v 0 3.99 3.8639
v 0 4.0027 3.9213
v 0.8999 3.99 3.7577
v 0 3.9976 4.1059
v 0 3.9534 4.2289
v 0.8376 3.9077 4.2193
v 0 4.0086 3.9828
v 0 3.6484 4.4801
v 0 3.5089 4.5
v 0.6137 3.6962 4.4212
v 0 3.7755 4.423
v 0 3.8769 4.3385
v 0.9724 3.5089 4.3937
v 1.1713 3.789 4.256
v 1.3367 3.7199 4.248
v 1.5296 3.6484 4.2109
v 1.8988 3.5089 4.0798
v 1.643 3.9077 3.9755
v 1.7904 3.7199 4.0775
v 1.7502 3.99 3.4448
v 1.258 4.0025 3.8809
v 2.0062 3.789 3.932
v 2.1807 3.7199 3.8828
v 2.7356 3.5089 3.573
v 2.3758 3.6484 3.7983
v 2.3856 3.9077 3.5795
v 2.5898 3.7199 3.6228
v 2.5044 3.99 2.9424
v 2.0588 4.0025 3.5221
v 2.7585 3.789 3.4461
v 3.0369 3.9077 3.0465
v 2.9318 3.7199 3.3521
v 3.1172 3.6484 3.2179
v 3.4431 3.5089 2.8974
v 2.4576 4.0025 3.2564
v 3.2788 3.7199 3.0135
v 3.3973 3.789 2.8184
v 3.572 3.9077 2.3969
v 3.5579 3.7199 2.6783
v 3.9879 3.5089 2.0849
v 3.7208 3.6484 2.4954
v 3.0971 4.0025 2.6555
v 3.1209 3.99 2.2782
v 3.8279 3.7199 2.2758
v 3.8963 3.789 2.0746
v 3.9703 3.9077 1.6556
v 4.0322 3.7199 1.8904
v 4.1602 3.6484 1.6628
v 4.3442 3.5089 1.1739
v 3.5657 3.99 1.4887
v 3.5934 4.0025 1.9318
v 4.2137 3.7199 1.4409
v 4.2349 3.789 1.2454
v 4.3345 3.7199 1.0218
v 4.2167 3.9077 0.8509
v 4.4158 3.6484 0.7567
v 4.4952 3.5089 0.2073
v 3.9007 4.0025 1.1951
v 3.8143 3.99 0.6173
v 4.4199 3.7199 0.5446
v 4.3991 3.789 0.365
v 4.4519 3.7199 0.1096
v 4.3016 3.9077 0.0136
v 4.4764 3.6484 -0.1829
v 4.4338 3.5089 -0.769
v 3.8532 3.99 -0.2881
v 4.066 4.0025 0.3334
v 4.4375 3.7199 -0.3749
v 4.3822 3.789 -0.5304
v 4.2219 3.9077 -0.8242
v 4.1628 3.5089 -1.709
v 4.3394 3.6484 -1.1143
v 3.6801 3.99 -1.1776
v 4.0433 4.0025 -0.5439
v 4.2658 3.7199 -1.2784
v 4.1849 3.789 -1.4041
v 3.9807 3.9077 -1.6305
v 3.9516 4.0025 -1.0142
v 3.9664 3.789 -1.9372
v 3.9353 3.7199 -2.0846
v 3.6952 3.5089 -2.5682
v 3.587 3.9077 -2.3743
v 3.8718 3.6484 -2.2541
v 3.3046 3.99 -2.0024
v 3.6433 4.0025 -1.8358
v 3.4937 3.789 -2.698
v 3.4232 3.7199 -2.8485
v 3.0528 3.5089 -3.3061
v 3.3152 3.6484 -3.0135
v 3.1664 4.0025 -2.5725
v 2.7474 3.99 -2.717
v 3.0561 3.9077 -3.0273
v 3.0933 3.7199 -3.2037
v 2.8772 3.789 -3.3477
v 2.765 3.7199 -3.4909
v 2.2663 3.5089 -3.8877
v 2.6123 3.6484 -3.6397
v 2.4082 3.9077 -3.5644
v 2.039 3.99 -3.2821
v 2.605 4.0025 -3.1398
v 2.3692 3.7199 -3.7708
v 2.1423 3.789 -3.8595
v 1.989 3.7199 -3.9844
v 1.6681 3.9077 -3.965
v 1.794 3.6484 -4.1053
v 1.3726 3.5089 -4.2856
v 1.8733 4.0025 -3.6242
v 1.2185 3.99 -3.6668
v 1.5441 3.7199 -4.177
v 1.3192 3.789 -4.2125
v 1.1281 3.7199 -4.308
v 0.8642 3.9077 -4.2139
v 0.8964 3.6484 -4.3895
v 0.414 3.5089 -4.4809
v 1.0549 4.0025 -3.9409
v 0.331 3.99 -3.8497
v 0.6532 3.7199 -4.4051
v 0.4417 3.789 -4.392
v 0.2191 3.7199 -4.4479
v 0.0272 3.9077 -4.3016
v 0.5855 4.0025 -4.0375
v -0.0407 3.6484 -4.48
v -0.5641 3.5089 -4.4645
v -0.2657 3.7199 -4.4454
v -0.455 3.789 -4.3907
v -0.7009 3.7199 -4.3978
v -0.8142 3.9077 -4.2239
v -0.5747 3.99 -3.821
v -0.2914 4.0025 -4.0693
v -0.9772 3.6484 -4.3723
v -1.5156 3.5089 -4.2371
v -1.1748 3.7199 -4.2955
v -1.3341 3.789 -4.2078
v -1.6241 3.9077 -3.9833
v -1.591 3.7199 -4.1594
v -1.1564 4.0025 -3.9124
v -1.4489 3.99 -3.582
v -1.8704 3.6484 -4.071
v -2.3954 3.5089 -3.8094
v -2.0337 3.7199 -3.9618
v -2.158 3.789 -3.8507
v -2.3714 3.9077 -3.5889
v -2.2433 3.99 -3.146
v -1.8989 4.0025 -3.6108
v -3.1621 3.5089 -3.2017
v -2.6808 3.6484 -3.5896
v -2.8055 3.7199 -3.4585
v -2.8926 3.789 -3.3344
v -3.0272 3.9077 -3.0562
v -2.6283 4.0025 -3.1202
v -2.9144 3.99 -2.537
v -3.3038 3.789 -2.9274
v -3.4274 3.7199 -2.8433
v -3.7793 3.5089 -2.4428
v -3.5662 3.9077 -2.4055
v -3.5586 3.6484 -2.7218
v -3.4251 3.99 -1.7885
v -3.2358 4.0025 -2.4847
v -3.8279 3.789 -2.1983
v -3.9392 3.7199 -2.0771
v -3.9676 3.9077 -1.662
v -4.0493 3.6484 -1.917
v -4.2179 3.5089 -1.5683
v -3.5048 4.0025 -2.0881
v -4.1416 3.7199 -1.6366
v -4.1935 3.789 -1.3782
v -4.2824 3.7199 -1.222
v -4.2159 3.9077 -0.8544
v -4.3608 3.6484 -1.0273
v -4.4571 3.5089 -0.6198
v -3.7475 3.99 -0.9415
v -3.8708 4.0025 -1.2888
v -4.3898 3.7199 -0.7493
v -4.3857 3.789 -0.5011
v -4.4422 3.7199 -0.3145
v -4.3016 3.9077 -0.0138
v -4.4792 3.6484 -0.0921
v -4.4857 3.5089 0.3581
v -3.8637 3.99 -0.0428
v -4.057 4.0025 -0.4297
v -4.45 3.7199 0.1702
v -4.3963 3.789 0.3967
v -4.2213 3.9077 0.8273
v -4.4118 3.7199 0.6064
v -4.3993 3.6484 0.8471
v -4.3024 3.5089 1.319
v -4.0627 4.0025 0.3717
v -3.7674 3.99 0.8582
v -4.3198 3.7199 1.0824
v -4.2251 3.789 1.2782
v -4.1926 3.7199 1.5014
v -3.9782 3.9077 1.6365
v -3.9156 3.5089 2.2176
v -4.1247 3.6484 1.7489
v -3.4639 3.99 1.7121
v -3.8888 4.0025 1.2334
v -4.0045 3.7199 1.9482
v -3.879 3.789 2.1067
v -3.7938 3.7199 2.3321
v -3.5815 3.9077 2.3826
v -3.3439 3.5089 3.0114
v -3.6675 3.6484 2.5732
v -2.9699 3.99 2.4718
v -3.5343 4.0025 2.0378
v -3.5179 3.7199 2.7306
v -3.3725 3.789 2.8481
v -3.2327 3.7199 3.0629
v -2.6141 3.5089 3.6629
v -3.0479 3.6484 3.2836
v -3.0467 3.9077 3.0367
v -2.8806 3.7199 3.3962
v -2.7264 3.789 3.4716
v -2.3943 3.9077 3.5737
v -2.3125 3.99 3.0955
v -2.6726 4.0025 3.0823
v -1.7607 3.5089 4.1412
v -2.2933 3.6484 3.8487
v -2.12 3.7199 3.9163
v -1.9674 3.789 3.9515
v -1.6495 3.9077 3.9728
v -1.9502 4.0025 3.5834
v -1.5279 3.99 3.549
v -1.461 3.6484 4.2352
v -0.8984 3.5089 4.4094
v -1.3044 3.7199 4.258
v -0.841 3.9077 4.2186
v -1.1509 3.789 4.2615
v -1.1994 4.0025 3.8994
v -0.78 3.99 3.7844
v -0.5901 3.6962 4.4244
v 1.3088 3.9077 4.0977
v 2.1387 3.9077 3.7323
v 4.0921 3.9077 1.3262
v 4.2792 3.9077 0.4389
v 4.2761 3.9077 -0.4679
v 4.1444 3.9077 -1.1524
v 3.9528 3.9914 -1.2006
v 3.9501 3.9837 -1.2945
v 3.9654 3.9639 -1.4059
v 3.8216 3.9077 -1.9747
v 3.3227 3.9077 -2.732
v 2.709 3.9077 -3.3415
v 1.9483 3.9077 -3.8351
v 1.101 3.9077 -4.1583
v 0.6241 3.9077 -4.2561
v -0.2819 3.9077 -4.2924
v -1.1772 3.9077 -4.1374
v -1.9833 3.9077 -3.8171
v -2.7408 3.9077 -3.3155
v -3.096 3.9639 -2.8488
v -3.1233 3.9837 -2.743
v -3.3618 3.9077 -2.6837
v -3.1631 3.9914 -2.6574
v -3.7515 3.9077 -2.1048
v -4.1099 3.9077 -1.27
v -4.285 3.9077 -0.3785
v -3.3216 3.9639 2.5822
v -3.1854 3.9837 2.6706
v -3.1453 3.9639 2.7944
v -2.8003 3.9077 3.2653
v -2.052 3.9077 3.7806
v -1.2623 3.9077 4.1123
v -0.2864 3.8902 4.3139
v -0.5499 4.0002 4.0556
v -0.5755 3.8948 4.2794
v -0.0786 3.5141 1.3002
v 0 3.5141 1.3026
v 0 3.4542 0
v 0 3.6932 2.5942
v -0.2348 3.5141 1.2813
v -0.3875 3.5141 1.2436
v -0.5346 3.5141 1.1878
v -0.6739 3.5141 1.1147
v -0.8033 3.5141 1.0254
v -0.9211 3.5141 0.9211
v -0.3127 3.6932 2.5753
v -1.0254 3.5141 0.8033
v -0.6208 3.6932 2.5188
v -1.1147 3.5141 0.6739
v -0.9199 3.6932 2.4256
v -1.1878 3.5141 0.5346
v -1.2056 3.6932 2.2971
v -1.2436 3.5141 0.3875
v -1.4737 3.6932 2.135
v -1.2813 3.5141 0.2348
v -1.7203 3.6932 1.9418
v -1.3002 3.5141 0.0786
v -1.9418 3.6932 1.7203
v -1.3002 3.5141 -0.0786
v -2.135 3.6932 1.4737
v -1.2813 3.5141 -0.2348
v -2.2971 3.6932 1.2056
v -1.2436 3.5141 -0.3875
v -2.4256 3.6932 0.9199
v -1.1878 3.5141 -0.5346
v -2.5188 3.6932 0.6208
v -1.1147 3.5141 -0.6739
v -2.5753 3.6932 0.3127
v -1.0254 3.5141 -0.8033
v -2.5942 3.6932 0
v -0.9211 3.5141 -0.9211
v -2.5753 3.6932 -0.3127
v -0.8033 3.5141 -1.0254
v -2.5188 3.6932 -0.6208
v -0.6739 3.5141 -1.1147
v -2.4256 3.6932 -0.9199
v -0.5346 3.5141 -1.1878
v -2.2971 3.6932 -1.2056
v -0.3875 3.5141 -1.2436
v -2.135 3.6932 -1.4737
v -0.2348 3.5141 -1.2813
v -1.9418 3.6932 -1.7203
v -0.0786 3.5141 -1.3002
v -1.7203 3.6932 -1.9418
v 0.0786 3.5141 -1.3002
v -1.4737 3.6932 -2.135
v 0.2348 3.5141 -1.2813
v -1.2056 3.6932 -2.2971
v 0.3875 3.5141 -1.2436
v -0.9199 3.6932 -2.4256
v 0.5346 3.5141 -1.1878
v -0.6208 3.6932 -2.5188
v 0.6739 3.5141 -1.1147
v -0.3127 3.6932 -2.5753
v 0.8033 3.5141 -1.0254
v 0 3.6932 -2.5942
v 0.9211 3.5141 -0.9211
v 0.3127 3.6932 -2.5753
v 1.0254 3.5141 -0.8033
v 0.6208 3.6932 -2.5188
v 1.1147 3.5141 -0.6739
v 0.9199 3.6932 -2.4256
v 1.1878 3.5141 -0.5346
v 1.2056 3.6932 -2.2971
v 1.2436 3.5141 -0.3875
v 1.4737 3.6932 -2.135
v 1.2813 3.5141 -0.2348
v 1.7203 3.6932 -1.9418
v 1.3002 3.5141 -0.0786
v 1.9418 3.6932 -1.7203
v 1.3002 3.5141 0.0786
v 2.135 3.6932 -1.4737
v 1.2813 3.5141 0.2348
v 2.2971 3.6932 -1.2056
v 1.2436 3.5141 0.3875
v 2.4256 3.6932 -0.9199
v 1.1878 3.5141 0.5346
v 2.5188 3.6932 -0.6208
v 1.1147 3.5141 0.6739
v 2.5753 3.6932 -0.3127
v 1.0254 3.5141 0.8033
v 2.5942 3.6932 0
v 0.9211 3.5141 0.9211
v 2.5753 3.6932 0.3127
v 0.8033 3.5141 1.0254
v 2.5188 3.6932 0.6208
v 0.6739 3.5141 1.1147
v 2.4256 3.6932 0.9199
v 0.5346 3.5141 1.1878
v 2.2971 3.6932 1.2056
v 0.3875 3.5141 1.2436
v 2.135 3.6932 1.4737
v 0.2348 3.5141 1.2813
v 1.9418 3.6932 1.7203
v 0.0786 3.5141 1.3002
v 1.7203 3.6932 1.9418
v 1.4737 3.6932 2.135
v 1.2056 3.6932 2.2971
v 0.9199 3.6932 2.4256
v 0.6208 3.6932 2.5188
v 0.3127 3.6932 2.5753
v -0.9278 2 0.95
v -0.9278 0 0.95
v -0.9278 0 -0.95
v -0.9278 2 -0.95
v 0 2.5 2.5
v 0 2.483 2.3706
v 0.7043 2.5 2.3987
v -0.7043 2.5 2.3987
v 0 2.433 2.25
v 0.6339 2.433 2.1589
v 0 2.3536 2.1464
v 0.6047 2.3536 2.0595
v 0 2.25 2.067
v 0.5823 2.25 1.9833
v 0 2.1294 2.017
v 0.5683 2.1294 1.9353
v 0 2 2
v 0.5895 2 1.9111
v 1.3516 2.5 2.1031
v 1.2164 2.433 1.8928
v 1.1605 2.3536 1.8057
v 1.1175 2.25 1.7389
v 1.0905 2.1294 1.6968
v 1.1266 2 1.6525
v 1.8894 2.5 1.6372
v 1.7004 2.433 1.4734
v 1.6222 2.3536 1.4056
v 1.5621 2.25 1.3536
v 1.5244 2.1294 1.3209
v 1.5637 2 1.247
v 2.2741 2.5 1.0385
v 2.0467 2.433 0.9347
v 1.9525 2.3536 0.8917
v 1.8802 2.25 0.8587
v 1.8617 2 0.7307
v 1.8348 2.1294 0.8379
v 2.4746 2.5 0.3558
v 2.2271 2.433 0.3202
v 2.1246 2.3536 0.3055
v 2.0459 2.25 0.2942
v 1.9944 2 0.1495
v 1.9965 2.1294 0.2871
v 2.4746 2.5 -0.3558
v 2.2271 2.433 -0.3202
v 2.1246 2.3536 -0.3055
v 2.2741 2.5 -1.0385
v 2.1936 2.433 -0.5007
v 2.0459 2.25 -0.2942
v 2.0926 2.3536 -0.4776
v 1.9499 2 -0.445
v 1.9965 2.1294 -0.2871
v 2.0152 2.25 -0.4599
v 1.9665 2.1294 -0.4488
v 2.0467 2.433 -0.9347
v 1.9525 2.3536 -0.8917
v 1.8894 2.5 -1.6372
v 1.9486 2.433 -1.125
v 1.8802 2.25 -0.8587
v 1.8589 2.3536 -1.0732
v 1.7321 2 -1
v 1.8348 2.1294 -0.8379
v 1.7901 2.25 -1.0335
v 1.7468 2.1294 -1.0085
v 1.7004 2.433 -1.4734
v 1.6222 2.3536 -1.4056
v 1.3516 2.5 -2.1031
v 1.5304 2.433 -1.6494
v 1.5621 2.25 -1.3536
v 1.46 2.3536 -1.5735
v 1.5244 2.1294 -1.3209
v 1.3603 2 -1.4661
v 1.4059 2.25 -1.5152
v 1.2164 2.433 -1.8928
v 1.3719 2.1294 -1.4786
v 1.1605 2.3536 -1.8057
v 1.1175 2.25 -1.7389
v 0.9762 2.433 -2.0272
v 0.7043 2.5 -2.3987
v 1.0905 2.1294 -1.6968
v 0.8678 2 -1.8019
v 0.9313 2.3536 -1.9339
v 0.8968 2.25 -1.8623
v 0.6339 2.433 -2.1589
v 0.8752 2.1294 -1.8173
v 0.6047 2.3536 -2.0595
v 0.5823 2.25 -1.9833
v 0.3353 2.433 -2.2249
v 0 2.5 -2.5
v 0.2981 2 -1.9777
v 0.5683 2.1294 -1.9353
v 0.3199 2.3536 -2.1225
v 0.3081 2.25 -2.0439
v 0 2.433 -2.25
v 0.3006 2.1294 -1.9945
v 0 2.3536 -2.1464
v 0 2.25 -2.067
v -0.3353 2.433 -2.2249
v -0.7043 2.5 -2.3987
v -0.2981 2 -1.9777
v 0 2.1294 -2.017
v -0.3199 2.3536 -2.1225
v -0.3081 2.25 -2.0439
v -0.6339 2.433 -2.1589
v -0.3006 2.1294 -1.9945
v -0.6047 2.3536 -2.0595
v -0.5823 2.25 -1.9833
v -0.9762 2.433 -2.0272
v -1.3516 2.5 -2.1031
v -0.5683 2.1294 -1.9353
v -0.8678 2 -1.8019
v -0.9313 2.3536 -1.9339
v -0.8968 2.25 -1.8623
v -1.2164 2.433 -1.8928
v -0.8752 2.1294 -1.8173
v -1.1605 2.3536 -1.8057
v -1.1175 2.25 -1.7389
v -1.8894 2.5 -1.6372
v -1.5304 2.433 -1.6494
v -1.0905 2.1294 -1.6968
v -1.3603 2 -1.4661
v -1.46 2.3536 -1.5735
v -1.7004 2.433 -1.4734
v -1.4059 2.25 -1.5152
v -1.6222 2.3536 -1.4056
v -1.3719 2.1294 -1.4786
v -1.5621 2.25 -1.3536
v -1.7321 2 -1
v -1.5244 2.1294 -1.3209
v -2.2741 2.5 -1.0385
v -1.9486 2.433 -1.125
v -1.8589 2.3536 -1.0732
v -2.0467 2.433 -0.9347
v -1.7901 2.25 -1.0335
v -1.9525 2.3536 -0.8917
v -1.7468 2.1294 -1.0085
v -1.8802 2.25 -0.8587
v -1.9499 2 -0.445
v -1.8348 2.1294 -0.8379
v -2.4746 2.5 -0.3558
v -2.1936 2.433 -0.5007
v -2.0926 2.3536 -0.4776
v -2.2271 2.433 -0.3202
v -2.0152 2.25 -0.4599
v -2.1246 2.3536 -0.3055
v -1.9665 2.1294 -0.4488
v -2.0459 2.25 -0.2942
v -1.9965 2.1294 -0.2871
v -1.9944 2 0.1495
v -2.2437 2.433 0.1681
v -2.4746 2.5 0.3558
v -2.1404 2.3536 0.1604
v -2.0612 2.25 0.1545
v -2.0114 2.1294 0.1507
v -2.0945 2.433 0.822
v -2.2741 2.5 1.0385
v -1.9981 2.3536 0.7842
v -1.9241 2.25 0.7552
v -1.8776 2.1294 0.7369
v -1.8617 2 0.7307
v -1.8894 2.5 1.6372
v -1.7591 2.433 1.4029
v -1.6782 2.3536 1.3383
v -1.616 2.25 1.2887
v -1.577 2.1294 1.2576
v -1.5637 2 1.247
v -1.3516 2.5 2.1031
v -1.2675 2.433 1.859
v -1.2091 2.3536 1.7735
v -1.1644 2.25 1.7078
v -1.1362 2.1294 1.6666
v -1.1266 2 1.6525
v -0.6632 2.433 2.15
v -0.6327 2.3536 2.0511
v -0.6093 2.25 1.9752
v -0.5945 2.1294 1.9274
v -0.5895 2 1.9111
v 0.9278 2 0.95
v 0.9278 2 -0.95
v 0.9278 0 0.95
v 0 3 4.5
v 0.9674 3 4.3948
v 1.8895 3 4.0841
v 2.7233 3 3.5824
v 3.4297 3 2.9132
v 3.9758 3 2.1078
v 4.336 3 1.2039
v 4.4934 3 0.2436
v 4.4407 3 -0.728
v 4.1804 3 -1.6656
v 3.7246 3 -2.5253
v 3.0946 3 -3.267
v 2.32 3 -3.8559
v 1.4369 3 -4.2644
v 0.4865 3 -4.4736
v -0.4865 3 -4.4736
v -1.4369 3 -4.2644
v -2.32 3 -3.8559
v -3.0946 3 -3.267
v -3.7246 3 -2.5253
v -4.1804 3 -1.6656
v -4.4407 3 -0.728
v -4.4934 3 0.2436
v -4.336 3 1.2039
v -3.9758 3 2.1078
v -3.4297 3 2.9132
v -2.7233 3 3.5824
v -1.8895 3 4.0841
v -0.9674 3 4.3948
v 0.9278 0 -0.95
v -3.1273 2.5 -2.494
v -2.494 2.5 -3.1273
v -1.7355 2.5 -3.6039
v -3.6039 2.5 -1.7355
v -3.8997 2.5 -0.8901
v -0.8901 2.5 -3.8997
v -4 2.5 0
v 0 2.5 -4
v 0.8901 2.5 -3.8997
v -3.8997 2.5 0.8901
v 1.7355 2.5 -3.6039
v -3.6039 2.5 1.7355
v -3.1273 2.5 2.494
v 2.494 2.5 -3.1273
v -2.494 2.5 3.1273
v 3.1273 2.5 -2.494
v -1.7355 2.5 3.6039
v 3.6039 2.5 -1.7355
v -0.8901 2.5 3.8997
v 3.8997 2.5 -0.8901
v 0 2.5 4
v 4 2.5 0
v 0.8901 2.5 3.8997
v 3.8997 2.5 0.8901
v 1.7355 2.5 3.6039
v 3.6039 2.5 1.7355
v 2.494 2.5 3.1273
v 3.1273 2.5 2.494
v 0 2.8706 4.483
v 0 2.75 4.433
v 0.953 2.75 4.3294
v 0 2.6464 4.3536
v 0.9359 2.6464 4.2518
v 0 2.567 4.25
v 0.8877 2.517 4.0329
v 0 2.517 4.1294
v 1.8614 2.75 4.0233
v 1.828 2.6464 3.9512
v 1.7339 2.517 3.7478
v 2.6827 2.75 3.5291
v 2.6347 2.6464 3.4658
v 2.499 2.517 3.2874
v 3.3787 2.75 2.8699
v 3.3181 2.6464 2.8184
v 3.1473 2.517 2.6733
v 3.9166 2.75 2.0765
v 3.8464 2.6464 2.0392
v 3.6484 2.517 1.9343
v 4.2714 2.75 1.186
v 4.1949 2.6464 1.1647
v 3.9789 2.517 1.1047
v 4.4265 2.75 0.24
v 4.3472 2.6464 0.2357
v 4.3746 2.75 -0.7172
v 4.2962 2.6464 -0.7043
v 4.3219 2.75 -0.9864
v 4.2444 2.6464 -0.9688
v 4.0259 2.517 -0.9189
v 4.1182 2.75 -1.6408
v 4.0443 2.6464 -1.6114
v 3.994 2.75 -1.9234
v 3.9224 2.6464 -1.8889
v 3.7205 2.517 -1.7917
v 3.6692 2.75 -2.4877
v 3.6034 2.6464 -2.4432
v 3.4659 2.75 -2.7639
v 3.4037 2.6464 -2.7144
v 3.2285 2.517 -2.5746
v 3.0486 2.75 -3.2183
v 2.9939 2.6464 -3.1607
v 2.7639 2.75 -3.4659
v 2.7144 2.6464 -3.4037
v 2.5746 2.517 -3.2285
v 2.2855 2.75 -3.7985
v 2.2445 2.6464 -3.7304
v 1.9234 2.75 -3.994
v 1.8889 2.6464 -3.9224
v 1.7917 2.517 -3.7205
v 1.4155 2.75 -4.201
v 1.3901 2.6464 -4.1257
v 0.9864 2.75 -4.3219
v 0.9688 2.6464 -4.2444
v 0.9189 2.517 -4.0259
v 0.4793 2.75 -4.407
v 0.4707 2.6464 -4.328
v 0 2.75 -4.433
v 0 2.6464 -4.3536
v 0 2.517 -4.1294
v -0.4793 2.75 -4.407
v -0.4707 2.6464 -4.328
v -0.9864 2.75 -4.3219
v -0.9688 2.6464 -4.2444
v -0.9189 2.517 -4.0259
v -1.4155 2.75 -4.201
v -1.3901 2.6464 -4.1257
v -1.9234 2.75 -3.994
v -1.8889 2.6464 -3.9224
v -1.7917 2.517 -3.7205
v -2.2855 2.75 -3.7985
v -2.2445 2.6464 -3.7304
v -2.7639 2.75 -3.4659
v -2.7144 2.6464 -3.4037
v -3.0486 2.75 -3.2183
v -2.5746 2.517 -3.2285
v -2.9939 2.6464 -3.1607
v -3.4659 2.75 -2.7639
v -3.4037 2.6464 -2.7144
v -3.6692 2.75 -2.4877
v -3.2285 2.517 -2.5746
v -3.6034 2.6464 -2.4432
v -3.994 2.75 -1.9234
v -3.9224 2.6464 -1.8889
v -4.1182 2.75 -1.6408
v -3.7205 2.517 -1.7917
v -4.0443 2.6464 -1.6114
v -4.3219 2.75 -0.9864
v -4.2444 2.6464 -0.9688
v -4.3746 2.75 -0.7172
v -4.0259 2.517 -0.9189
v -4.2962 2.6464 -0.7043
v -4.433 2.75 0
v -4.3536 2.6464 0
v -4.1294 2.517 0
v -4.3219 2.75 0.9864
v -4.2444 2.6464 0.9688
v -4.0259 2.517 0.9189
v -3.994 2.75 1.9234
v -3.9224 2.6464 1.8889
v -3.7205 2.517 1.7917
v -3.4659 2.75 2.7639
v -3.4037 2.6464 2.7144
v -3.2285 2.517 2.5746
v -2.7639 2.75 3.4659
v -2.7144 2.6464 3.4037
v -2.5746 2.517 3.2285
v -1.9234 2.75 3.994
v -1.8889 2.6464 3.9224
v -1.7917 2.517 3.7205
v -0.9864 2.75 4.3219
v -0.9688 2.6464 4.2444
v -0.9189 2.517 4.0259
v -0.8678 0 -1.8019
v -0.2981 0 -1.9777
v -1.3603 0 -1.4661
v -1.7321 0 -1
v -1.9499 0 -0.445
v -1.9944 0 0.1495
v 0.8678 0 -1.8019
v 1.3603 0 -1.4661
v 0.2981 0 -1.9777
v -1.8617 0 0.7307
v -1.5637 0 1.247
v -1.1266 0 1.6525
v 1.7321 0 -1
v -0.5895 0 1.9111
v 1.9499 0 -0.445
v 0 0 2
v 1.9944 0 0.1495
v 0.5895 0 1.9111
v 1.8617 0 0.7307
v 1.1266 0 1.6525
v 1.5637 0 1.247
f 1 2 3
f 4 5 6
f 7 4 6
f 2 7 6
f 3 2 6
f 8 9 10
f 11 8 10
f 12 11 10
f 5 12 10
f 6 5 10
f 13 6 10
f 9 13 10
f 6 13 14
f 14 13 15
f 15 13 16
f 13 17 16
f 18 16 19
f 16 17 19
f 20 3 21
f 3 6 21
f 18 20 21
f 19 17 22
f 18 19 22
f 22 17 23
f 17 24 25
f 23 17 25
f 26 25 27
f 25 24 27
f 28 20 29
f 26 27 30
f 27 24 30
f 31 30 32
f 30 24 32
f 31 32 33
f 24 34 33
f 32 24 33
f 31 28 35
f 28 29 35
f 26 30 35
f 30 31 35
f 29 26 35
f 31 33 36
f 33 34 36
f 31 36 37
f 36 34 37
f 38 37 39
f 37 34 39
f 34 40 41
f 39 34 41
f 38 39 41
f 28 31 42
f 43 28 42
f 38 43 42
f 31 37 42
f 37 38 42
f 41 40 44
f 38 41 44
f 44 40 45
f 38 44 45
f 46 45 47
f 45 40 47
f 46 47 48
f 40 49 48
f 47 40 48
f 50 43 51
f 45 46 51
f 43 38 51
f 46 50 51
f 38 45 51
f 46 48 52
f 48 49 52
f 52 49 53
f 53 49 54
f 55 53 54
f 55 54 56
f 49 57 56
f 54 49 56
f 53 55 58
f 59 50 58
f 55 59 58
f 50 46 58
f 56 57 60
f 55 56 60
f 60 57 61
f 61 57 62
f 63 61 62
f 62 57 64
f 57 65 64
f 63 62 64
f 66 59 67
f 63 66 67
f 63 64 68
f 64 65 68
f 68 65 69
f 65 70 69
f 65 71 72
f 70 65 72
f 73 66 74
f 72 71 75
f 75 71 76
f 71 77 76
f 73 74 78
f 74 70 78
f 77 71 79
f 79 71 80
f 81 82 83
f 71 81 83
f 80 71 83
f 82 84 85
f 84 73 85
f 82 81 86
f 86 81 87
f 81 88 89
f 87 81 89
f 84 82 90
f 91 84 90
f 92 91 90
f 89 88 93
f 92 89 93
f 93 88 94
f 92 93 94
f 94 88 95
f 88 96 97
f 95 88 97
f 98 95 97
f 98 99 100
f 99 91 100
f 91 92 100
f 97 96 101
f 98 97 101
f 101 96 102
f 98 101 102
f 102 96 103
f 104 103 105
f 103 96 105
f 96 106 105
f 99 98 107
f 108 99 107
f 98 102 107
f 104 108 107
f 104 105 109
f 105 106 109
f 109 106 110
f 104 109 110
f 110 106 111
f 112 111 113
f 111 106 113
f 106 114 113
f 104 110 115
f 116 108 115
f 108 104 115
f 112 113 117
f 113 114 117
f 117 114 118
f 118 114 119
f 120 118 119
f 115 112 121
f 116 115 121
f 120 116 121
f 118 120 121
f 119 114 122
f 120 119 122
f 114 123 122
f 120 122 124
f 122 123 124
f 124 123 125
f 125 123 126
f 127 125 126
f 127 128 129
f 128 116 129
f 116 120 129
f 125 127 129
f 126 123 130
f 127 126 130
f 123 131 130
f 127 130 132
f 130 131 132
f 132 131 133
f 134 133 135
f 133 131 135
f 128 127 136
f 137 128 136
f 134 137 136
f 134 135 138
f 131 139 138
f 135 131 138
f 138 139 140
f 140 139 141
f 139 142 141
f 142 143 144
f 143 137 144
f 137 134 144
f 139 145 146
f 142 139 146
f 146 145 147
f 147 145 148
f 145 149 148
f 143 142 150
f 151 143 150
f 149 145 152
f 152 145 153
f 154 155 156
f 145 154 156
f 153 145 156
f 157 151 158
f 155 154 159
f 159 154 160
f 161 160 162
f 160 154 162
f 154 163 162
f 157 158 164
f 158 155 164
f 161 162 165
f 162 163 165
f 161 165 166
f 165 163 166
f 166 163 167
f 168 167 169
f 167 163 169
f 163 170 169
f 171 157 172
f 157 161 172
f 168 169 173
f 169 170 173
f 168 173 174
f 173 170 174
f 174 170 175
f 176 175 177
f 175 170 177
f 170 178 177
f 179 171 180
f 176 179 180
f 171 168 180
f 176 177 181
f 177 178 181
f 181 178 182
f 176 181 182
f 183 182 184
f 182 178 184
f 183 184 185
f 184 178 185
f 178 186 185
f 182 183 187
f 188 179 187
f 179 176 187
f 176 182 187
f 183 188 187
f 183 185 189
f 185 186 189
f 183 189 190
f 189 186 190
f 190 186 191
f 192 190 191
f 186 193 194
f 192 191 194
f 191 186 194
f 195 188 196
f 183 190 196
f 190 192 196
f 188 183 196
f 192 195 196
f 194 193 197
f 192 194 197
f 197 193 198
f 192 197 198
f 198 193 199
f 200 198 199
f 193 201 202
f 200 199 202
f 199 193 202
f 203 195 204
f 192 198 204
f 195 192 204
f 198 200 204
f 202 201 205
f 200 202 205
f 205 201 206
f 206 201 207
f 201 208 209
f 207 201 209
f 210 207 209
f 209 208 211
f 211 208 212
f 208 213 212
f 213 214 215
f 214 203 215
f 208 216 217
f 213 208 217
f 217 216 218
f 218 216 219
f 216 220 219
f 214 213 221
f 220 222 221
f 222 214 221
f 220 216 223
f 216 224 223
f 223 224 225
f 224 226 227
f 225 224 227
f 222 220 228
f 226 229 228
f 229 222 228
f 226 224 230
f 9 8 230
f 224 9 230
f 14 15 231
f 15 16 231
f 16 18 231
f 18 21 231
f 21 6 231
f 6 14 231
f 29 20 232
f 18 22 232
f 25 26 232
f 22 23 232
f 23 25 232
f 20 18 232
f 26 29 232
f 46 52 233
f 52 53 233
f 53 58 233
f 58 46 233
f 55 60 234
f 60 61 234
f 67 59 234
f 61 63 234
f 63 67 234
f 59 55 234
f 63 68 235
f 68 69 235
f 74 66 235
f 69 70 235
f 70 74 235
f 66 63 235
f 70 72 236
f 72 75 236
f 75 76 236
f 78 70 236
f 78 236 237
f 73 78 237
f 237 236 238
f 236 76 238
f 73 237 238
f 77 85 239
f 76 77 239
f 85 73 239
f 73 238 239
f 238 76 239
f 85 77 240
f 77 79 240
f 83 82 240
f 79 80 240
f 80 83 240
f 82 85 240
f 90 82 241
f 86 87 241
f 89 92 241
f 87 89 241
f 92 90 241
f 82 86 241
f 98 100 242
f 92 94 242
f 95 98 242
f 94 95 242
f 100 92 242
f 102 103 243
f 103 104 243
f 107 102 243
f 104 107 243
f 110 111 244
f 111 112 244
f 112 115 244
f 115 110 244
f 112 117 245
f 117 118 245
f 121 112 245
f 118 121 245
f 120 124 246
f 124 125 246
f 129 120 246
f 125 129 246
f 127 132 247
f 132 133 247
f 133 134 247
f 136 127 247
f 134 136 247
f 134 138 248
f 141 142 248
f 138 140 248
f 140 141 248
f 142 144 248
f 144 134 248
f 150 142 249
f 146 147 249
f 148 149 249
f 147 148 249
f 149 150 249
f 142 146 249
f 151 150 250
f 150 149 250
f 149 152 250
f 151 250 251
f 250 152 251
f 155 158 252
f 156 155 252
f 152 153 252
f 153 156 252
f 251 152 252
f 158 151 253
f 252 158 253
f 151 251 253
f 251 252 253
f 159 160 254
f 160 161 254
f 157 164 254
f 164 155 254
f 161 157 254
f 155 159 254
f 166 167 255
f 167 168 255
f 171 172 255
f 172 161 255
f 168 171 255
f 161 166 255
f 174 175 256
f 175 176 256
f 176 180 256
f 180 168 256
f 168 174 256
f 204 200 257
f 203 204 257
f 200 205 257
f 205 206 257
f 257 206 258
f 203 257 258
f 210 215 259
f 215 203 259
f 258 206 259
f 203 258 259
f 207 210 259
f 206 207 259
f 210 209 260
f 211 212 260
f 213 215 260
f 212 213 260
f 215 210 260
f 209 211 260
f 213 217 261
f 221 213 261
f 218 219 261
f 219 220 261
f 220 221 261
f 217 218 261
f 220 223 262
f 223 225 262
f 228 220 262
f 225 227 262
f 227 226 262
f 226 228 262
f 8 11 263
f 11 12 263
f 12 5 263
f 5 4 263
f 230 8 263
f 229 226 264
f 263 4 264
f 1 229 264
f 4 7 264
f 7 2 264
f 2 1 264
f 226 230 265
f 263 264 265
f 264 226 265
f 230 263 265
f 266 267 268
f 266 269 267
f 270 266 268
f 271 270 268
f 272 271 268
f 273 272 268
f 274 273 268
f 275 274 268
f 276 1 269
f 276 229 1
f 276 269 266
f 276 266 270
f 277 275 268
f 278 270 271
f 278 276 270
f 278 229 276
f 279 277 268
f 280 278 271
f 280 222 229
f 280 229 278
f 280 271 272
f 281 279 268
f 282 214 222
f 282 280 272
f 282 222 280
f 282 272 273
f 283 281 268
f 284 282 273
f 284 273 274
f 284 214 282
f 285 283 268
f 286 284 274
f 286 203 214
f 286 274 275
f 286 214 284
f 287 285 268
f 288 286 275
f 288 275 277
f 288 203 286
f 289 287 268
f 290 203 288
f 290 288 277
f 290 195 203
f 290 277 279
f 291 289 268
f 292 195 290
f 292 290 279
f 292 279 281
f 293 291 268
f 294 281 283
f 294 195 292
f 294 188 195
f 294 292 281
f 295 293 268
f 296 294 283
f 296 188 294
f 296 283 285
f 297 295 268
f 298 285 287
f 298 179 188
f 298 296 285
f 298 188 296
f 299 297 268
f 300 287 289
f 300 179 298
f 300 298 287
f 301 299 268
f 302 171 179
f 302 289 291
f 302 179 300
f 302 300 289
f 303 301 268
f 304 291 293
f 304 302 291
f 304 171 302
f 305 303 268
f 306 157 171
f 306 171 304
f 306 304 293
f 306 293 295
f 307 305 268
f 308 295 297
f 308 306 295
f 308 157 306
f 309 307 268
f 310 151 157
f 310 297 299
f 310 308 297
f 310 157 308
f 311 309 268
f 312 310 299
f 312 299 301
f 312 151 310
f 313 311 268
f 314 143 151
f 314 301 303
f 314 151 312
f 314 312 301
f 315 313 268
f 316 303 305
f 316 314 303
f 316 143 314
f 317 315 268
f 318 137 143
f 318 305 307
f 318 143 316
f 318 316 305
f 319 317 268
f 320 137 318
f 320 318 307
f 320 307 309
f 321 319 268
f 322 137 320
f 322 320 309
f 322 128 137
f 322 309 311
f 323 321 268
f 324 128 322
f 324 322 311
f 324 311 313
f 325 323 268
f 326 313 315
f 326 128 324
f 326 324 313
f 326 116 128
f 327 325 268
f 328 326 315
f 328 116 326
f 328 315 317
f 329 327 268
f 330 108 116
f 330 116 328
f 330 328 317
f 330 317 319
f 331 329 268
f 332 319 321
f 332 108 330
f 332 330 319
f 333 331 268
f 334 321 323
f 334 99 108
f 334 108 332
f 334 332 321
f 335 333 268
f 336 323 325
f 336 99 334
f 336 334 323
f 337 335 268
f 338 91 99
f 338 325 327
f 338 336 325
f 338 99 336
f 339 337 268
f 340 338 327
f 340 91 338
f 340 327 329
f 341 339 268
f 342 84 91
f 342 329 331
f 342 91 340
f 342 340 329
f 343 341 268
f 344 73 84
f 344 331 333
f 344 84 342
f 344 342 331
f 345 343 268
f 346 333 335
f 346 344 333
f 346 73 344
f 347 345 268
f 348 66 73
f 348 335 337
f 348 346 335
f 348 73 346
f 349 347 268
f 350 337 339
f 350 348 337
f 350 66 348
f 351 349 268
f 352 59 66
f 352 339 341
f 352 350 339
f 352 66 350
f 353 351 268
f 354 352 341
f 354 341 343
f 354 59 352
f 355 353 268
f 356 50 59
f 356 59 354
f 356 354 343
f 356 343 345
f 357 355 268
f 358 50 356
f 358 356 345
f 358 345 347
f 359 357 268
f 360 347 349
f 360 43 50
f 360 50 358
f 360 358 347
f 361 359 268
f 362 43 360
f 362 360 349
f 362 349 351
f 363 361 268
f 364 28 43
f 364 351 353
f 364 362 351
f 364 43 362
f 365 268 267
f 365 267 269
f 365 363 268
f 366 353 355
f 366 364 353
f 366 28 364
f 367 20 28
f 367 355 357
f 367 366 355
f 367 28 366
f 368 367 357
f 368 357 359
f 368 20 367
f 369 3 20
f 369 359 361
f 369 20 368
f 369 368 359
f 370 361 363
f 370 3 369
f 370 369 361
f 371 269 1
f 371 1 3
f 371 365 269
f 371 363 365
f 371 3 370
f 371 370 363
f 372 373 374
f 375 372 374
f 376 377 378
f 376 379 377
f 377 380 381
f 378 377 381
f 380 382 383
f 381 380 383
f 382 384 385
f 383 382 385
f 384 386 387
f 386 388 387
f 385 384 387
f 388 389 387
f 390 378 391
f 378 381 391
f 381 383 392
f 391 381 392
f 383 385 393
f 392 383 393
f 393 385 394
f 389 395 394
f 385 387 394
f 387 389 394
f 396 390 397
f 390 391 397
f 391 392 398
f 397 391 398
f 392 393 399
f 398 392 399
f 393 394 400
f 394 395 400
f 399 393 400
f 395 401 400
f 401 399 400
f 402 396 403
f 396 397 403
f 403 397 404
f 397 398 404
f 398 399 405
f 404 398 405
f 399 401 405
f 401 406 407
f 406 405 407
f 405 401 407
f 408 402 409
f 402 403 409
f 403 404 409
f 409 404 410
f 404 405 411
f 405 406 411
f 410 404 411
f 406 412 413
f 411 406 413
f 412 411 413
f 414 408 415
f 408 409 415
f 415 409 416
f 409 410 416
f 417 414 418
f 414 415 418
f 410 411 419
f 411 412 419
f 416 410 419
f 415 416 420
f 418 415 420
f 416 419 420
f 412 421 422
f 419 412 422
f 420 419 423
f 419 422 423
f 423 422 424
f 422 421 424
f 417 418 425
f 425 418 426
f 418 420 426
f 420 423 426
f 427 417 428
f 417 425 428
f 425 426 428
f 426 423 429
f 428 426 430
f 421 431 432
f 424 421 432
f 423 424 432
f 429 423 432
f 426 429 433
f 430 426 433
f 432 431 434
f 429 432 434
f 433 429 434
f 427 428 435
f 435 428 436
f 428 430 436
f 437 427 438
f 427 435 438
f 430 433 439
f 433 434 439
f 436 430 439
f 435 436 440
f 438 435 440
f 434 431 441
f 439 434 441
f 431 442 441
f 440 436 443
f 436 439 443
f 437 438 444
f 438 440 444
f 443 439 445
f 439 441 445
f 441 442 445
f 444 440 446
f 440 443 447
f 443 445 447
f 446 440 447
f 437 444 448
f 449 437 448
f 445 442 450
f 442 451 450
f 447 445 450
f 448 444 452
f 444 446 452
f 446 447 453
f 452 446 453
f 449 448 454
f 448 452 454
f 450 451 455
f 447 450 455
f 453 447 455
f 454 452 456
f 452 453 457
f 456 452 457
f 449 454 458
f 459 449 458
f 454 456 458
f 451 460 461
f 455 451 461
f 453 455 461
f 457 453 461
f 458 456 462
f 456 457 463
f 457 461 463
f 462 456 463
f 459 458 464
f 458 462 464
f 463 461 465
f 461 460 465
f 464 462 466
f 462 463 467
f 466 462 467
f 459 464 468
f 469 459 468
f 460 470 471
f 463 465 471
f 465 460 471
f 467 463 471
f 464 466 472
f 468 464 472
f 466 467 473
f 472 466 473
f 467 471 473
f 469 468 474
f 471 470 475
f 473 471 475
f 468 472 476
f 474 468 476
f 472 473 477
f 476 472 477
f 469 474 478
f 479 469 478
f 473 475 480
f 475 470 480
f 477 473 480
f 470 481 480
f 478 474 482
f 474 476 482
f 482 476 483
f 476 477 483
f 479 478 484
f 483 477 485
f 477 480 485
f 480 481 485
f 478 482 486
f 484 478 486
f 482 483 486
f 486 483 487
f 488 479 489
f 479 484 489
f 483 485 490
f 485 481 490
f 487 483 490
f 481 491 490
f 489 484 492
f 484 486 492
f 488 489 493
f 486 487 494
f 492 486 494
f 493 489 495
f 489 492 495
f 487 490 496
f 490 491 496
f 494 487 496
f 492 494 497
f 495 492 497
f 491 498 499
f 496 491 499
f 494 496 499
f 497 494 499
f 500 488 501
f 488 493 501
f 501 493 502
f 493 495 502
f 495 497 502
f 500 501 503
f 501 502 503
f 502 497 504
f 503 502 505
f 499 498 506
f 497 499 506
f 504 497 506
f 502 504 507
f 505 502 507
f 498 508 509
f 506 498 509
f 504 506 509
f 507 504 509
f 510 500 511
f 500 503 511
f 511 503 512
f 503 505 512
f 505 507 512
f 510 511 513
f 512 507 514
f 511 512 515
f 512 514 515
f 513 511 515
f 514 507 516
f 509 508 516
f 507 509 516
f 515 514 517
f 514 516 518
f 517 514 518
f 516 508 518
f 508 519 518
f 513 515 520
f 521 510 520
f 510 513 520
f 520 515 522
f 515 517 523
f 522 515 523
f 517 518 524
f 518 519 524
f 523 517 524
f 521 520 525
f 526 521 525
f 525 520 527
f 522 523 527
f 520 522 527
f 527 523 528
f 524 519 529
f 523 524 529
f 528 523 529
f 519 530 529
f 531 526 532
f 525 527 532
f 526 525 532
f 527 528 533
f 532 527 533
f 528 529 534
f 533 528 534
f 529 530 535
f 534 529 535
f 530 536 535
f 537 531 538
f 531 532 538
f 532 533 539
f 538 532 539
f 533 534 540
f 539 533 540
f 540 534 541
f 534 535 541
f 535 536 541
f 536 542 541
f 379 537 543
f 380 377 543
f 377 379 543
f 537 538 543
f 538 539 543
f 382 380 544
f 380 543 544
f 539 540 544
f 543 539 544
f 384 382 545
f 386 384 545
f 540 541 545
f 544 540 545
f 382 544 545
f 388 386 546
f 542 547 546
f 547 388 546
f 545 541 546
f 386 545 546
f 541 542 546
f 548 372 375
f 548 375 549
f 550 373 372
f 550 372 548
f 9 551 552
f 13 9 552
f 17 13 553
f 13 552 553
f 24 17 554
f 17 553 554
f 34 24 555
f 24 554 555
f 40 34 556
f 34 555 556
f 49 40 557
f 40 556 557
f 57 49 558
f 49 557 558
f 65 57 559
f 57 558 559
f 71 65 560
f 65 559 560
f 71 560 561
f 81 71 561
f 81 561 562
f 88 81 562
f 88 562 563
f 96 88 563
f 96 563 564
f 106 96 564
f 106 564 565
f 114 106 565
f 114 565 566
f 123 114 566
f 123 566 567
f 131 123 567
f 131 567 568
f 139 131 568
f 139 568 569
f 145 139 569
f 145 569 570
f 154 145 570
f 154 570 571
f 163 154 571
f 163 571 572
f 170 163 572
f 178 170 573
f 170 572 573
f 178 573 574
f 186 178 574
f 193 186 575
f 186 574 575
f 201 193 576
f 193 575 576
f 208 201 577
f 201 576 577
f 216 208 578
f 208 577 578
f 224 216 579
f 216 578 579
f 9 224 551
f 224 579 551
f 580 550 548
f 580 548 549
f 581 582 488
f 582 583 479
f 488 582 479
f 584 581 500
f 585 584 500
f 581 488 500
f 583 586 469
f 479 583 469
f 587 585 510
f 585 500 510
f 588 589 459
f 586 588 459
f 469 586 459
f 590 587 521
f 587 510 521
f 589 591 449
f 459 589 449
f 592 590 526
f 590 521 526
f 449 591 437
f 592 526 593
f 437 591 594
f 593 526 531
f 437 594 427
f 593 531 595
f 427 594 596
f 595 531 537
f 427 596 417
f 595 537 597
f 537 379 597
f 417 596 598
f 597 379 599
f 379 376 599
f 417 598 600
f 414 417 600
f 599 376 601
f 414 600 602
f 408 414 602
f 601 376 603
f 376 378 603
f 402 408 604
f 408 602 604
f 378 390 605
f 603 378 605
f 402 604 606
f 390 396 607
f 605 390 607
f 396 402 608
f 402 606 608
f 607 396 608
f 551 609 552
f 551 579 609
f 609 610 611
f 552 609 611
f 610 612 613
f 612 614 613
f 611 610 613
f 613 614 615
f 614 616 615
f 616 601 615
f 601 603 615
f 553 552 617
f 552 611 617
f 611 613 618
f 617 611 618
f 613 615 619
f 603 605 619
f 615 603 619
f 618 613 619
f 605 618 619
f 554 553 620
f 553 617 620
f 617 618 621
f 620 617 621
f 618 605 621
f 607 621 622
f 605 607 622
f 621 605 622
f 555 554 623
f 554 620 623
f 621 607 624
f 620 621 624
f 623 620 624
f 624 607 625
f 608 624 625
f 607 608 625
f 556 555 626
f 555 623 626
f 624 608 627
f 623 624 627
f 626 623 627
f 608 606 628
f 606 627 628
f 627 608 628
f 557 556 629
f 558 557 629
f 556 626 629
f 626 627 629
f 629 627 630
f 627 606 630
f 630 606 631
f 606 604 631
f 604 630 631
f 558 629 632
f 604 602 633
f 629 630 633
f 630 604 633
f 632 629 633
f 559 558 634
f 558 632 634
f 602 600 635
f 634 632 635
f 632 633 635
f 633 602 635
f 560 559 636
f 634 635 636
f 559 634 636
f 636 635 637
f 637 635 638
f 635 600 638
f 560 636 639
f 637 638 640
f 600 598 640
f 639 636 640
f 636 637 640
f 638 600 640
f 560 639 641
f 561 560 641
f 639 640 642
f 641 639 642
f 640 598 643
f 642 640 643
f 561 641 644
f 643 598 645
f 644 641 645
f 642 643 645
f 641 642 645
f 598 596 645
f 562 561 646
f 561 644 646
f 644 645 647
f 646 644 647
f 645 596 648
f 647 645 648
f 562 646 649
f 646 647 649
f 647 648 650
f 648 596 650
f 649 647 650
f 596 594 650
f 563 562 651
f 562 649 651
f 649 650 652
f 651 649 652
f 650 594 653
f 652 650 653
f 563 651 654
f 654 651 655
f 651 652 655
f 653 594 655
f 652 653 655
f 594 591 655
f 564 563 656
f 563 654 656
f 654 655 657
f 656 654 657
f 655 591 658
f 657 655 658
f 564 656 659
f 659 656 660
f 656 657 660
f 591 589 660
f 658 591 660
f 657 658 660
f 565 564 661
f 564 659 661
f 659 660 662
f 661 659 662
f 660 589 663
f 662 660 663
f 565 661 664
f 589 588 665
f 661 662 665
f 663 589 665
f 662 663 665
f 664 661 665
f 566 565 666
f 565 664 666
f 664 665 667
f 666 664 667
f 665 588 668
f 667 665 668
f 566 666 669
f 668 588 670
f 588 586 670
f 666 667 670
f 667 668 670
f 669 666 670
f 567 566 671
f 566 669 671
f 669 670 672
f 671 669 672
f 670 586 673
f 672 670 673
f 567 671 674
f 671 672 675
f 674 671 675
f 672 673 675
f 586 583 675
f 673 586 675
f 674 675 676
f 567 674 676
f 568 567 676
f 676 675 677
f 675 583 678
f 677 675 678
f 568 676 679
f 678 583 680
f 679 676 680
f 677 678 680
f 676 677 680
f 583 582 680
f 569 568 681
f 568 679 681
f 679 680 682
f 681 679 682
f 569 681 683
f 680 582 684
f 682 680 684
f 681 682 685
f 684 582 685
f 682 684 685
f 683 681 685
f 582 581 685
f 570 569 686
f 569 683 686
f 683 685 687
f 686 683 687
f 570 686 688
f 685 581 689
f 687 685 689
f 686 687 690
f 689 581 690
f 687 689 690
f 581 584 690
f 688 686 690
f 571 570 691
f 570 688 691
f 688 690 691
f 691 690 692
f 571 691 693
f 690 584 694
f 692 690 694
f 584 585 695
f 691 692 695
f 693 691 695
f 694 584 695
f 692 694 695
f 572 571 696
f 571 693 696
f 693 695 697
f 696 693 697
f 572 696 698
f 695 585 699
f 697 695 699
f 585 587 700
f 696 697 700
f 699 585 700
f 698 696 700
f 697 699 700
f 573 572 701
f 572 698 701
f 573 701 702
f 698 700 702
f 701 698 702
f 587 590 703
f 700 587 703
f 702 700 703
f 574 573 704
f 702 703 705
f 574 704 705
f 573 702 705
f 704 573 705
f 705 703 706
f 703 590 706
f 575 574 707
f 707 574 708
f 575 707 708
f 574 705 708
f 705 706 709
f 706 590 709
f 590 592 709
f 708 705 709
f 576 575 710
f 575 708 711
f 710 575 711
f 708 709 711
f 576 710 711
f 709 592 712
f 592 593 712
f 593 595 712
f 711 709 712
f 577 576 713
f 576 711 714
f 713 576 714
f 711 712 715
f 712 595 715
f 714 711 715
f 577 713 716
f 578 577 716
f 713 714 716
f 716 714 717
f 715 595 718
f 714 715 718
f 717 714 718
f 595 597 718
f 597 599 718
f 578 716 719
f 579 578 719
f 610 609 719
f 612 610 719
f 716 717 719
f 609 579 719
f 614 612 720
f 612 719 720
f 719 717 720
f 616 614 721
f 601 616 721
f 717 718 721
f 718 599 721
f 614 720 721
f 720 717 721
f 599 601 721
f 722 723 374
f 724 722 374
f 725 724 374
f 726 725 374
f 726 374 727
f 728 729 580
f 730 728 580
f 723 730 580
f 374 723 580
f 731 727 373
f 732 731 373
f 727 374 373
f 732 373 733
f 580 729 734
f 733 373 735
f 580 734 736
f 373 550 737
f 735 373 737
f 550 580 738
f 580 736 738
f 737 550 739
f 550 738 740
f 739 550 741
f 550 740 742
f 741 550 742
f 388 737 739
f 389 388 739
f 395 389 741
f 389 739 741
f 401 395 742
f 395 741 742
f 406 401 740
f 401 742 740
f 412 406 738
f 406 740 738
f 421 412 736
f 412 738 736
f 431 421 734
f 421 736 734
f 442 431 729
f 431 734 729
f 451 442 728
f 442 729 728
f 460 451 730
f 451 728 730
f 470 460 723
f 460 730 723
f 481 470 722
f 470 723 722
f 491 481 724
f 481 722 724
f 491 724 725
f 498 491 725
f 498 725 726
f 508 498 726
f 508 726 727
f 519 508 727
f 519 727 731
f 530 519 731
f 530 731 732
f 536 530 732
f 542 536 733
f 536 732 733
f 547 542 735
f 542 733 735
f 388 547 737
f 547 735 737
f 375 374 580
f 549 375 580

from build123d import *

# Parameters (mm, degrees)
SKETCH_1_R      = 2
SKETCH_1_W      = 1.855595784
SKETCH_1_H      = 1.9
EXTRUDE_1_DEPTH = 2.5
SKETCH_2_R      = 4.5
EXTRUDE_2_DEPTH = 2
FILLET_2_R      = 0.5
SKETCH_4_W      = 1.855595784
SKETCH_4_H      = 1.9
EXTRUDE_3_DEPTH = 0.5


with BuildPart() as part:
    # 草图1 → 凸台-拉伸1 (new body)
    with BuildSketch(Plane(origin=(0, 0, 0), x_dir=(1, 0, 0), z_dir=(0, 1, 0))):
        with Locations(Location((0, 0, 0), (0, 0, 270))):
            Circle(SKETCH_1_R)
        Rectangle(SKETCH_1_W, SKETCH_1_H, mode=Mode.SUBTRACT)
    extrude(amount=EXTRUDE_1_DEPTH)

    # 草图2 → 凸台-拉伸2 (add)
    with BuildSketch(Plane(origin=(0, 2.5, 0), x_dir=(1, 0, 0), z_dir=(0, 1, 0))):
        with Locations(Location((0, 0, 0), (0, 0, 270))):
            Circle(SKETCH_2_R)
    extrude(amount=EXTRUDE_2_DEPTH)

    # 草图3 → 切除-旋转6 (revolve, cut)
    with BuildSketch(Plane.XY, mode=Mode.PRIVATE) as cut_revolve_6_sk:
        with BuildLine():
            Line((-5.348495513, 4.5), (0, 4.5))
            Line((0, 4.5), (0, 3.454223495))
            ThreePointArc((0, 3.454223495), (-2.724887739, 3.718119778), (-5.348495513, 4.5))
        make_face()
    revolve(cut_revolve_6_sk.sketch.rotate(Axis((0, 4.5, 0), (0, -1, 0)), 270), axis=Axis((0, 4.5, 0), (0, -1, 0)), mode=Mode.SUBTRACT)

    # 圆角2
    fillet_2_edges = [part.edges().sort_by_distance(p)[0] for p in [
        (0, 2.5, -4.5),
        (0, 4.186113011, -4.5),
        (0, 2.5, -2),
    ]]
    fillet(fillet_2_edges, radius=FILLET_2_R)

    # 草图4 → 凸台-拉伸3 (add)
    with BuildSketch(Plane.XZ.offset(-2.5)):
        Rectangle(SKETCH_4_W, SKETCH_4_H)
    extrude(amount=EXTRUDE_3_DEPTH)


solid = part.part
